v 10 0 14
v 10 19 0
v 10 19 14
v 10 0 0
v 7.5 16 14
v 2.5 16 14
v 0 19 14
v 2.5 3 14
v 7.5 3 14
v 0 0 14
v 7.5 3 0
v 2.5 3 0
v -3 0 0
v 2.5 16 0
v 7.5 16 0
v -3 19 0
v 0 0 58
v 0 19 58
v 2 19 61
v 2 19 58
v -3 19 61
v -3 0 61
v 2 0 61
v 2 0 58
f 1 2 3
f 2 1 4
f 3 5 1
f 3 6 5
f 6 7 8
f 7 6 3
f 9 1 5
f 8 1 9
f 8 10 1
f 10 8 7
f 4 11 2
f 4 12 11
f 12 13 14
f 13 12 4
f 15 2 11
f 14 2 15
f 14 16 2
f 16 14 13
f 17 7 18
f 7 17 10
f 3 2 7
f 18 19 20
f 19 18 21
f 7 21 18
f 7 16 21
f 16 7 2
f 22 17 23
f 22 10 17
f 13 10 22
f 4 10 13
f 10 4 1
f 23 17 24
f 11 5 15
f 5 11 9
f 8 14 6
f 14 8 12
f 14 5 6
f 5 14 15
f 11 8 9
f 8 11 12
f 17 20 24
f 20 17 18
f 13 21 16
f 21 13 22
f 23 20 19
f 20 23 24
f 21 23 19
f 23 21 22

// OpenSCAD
// total length of device less the length of the type A connector
LengthOfBody=44;
// thickness from centerline of type A connector to bottom
// if the device is symmetrical, this value is the thickness of the body / 2
BottomHalfBodyThickness=5;
// tab hight to hold device in place
HeightOfLatch=5;


difference()
{
	// a cube to hold the USB type A connector
	// on the device
	cube([10,19,14]);
	
	// make a hole to slide the type A connector into
	translate([((BottomHalfBodyThickness*2)-5)/2,(19-13)/2,0])
	cube([5,13,15]);
}

// bottom plate to hold everything together
translate([-3,0,0])
cube([3,19,LengthOfBody+14]);

// clip to hold the device in place
translate([-3,0,LengthOfBody+14])
cube([HeightOfLatch,19,3]);
